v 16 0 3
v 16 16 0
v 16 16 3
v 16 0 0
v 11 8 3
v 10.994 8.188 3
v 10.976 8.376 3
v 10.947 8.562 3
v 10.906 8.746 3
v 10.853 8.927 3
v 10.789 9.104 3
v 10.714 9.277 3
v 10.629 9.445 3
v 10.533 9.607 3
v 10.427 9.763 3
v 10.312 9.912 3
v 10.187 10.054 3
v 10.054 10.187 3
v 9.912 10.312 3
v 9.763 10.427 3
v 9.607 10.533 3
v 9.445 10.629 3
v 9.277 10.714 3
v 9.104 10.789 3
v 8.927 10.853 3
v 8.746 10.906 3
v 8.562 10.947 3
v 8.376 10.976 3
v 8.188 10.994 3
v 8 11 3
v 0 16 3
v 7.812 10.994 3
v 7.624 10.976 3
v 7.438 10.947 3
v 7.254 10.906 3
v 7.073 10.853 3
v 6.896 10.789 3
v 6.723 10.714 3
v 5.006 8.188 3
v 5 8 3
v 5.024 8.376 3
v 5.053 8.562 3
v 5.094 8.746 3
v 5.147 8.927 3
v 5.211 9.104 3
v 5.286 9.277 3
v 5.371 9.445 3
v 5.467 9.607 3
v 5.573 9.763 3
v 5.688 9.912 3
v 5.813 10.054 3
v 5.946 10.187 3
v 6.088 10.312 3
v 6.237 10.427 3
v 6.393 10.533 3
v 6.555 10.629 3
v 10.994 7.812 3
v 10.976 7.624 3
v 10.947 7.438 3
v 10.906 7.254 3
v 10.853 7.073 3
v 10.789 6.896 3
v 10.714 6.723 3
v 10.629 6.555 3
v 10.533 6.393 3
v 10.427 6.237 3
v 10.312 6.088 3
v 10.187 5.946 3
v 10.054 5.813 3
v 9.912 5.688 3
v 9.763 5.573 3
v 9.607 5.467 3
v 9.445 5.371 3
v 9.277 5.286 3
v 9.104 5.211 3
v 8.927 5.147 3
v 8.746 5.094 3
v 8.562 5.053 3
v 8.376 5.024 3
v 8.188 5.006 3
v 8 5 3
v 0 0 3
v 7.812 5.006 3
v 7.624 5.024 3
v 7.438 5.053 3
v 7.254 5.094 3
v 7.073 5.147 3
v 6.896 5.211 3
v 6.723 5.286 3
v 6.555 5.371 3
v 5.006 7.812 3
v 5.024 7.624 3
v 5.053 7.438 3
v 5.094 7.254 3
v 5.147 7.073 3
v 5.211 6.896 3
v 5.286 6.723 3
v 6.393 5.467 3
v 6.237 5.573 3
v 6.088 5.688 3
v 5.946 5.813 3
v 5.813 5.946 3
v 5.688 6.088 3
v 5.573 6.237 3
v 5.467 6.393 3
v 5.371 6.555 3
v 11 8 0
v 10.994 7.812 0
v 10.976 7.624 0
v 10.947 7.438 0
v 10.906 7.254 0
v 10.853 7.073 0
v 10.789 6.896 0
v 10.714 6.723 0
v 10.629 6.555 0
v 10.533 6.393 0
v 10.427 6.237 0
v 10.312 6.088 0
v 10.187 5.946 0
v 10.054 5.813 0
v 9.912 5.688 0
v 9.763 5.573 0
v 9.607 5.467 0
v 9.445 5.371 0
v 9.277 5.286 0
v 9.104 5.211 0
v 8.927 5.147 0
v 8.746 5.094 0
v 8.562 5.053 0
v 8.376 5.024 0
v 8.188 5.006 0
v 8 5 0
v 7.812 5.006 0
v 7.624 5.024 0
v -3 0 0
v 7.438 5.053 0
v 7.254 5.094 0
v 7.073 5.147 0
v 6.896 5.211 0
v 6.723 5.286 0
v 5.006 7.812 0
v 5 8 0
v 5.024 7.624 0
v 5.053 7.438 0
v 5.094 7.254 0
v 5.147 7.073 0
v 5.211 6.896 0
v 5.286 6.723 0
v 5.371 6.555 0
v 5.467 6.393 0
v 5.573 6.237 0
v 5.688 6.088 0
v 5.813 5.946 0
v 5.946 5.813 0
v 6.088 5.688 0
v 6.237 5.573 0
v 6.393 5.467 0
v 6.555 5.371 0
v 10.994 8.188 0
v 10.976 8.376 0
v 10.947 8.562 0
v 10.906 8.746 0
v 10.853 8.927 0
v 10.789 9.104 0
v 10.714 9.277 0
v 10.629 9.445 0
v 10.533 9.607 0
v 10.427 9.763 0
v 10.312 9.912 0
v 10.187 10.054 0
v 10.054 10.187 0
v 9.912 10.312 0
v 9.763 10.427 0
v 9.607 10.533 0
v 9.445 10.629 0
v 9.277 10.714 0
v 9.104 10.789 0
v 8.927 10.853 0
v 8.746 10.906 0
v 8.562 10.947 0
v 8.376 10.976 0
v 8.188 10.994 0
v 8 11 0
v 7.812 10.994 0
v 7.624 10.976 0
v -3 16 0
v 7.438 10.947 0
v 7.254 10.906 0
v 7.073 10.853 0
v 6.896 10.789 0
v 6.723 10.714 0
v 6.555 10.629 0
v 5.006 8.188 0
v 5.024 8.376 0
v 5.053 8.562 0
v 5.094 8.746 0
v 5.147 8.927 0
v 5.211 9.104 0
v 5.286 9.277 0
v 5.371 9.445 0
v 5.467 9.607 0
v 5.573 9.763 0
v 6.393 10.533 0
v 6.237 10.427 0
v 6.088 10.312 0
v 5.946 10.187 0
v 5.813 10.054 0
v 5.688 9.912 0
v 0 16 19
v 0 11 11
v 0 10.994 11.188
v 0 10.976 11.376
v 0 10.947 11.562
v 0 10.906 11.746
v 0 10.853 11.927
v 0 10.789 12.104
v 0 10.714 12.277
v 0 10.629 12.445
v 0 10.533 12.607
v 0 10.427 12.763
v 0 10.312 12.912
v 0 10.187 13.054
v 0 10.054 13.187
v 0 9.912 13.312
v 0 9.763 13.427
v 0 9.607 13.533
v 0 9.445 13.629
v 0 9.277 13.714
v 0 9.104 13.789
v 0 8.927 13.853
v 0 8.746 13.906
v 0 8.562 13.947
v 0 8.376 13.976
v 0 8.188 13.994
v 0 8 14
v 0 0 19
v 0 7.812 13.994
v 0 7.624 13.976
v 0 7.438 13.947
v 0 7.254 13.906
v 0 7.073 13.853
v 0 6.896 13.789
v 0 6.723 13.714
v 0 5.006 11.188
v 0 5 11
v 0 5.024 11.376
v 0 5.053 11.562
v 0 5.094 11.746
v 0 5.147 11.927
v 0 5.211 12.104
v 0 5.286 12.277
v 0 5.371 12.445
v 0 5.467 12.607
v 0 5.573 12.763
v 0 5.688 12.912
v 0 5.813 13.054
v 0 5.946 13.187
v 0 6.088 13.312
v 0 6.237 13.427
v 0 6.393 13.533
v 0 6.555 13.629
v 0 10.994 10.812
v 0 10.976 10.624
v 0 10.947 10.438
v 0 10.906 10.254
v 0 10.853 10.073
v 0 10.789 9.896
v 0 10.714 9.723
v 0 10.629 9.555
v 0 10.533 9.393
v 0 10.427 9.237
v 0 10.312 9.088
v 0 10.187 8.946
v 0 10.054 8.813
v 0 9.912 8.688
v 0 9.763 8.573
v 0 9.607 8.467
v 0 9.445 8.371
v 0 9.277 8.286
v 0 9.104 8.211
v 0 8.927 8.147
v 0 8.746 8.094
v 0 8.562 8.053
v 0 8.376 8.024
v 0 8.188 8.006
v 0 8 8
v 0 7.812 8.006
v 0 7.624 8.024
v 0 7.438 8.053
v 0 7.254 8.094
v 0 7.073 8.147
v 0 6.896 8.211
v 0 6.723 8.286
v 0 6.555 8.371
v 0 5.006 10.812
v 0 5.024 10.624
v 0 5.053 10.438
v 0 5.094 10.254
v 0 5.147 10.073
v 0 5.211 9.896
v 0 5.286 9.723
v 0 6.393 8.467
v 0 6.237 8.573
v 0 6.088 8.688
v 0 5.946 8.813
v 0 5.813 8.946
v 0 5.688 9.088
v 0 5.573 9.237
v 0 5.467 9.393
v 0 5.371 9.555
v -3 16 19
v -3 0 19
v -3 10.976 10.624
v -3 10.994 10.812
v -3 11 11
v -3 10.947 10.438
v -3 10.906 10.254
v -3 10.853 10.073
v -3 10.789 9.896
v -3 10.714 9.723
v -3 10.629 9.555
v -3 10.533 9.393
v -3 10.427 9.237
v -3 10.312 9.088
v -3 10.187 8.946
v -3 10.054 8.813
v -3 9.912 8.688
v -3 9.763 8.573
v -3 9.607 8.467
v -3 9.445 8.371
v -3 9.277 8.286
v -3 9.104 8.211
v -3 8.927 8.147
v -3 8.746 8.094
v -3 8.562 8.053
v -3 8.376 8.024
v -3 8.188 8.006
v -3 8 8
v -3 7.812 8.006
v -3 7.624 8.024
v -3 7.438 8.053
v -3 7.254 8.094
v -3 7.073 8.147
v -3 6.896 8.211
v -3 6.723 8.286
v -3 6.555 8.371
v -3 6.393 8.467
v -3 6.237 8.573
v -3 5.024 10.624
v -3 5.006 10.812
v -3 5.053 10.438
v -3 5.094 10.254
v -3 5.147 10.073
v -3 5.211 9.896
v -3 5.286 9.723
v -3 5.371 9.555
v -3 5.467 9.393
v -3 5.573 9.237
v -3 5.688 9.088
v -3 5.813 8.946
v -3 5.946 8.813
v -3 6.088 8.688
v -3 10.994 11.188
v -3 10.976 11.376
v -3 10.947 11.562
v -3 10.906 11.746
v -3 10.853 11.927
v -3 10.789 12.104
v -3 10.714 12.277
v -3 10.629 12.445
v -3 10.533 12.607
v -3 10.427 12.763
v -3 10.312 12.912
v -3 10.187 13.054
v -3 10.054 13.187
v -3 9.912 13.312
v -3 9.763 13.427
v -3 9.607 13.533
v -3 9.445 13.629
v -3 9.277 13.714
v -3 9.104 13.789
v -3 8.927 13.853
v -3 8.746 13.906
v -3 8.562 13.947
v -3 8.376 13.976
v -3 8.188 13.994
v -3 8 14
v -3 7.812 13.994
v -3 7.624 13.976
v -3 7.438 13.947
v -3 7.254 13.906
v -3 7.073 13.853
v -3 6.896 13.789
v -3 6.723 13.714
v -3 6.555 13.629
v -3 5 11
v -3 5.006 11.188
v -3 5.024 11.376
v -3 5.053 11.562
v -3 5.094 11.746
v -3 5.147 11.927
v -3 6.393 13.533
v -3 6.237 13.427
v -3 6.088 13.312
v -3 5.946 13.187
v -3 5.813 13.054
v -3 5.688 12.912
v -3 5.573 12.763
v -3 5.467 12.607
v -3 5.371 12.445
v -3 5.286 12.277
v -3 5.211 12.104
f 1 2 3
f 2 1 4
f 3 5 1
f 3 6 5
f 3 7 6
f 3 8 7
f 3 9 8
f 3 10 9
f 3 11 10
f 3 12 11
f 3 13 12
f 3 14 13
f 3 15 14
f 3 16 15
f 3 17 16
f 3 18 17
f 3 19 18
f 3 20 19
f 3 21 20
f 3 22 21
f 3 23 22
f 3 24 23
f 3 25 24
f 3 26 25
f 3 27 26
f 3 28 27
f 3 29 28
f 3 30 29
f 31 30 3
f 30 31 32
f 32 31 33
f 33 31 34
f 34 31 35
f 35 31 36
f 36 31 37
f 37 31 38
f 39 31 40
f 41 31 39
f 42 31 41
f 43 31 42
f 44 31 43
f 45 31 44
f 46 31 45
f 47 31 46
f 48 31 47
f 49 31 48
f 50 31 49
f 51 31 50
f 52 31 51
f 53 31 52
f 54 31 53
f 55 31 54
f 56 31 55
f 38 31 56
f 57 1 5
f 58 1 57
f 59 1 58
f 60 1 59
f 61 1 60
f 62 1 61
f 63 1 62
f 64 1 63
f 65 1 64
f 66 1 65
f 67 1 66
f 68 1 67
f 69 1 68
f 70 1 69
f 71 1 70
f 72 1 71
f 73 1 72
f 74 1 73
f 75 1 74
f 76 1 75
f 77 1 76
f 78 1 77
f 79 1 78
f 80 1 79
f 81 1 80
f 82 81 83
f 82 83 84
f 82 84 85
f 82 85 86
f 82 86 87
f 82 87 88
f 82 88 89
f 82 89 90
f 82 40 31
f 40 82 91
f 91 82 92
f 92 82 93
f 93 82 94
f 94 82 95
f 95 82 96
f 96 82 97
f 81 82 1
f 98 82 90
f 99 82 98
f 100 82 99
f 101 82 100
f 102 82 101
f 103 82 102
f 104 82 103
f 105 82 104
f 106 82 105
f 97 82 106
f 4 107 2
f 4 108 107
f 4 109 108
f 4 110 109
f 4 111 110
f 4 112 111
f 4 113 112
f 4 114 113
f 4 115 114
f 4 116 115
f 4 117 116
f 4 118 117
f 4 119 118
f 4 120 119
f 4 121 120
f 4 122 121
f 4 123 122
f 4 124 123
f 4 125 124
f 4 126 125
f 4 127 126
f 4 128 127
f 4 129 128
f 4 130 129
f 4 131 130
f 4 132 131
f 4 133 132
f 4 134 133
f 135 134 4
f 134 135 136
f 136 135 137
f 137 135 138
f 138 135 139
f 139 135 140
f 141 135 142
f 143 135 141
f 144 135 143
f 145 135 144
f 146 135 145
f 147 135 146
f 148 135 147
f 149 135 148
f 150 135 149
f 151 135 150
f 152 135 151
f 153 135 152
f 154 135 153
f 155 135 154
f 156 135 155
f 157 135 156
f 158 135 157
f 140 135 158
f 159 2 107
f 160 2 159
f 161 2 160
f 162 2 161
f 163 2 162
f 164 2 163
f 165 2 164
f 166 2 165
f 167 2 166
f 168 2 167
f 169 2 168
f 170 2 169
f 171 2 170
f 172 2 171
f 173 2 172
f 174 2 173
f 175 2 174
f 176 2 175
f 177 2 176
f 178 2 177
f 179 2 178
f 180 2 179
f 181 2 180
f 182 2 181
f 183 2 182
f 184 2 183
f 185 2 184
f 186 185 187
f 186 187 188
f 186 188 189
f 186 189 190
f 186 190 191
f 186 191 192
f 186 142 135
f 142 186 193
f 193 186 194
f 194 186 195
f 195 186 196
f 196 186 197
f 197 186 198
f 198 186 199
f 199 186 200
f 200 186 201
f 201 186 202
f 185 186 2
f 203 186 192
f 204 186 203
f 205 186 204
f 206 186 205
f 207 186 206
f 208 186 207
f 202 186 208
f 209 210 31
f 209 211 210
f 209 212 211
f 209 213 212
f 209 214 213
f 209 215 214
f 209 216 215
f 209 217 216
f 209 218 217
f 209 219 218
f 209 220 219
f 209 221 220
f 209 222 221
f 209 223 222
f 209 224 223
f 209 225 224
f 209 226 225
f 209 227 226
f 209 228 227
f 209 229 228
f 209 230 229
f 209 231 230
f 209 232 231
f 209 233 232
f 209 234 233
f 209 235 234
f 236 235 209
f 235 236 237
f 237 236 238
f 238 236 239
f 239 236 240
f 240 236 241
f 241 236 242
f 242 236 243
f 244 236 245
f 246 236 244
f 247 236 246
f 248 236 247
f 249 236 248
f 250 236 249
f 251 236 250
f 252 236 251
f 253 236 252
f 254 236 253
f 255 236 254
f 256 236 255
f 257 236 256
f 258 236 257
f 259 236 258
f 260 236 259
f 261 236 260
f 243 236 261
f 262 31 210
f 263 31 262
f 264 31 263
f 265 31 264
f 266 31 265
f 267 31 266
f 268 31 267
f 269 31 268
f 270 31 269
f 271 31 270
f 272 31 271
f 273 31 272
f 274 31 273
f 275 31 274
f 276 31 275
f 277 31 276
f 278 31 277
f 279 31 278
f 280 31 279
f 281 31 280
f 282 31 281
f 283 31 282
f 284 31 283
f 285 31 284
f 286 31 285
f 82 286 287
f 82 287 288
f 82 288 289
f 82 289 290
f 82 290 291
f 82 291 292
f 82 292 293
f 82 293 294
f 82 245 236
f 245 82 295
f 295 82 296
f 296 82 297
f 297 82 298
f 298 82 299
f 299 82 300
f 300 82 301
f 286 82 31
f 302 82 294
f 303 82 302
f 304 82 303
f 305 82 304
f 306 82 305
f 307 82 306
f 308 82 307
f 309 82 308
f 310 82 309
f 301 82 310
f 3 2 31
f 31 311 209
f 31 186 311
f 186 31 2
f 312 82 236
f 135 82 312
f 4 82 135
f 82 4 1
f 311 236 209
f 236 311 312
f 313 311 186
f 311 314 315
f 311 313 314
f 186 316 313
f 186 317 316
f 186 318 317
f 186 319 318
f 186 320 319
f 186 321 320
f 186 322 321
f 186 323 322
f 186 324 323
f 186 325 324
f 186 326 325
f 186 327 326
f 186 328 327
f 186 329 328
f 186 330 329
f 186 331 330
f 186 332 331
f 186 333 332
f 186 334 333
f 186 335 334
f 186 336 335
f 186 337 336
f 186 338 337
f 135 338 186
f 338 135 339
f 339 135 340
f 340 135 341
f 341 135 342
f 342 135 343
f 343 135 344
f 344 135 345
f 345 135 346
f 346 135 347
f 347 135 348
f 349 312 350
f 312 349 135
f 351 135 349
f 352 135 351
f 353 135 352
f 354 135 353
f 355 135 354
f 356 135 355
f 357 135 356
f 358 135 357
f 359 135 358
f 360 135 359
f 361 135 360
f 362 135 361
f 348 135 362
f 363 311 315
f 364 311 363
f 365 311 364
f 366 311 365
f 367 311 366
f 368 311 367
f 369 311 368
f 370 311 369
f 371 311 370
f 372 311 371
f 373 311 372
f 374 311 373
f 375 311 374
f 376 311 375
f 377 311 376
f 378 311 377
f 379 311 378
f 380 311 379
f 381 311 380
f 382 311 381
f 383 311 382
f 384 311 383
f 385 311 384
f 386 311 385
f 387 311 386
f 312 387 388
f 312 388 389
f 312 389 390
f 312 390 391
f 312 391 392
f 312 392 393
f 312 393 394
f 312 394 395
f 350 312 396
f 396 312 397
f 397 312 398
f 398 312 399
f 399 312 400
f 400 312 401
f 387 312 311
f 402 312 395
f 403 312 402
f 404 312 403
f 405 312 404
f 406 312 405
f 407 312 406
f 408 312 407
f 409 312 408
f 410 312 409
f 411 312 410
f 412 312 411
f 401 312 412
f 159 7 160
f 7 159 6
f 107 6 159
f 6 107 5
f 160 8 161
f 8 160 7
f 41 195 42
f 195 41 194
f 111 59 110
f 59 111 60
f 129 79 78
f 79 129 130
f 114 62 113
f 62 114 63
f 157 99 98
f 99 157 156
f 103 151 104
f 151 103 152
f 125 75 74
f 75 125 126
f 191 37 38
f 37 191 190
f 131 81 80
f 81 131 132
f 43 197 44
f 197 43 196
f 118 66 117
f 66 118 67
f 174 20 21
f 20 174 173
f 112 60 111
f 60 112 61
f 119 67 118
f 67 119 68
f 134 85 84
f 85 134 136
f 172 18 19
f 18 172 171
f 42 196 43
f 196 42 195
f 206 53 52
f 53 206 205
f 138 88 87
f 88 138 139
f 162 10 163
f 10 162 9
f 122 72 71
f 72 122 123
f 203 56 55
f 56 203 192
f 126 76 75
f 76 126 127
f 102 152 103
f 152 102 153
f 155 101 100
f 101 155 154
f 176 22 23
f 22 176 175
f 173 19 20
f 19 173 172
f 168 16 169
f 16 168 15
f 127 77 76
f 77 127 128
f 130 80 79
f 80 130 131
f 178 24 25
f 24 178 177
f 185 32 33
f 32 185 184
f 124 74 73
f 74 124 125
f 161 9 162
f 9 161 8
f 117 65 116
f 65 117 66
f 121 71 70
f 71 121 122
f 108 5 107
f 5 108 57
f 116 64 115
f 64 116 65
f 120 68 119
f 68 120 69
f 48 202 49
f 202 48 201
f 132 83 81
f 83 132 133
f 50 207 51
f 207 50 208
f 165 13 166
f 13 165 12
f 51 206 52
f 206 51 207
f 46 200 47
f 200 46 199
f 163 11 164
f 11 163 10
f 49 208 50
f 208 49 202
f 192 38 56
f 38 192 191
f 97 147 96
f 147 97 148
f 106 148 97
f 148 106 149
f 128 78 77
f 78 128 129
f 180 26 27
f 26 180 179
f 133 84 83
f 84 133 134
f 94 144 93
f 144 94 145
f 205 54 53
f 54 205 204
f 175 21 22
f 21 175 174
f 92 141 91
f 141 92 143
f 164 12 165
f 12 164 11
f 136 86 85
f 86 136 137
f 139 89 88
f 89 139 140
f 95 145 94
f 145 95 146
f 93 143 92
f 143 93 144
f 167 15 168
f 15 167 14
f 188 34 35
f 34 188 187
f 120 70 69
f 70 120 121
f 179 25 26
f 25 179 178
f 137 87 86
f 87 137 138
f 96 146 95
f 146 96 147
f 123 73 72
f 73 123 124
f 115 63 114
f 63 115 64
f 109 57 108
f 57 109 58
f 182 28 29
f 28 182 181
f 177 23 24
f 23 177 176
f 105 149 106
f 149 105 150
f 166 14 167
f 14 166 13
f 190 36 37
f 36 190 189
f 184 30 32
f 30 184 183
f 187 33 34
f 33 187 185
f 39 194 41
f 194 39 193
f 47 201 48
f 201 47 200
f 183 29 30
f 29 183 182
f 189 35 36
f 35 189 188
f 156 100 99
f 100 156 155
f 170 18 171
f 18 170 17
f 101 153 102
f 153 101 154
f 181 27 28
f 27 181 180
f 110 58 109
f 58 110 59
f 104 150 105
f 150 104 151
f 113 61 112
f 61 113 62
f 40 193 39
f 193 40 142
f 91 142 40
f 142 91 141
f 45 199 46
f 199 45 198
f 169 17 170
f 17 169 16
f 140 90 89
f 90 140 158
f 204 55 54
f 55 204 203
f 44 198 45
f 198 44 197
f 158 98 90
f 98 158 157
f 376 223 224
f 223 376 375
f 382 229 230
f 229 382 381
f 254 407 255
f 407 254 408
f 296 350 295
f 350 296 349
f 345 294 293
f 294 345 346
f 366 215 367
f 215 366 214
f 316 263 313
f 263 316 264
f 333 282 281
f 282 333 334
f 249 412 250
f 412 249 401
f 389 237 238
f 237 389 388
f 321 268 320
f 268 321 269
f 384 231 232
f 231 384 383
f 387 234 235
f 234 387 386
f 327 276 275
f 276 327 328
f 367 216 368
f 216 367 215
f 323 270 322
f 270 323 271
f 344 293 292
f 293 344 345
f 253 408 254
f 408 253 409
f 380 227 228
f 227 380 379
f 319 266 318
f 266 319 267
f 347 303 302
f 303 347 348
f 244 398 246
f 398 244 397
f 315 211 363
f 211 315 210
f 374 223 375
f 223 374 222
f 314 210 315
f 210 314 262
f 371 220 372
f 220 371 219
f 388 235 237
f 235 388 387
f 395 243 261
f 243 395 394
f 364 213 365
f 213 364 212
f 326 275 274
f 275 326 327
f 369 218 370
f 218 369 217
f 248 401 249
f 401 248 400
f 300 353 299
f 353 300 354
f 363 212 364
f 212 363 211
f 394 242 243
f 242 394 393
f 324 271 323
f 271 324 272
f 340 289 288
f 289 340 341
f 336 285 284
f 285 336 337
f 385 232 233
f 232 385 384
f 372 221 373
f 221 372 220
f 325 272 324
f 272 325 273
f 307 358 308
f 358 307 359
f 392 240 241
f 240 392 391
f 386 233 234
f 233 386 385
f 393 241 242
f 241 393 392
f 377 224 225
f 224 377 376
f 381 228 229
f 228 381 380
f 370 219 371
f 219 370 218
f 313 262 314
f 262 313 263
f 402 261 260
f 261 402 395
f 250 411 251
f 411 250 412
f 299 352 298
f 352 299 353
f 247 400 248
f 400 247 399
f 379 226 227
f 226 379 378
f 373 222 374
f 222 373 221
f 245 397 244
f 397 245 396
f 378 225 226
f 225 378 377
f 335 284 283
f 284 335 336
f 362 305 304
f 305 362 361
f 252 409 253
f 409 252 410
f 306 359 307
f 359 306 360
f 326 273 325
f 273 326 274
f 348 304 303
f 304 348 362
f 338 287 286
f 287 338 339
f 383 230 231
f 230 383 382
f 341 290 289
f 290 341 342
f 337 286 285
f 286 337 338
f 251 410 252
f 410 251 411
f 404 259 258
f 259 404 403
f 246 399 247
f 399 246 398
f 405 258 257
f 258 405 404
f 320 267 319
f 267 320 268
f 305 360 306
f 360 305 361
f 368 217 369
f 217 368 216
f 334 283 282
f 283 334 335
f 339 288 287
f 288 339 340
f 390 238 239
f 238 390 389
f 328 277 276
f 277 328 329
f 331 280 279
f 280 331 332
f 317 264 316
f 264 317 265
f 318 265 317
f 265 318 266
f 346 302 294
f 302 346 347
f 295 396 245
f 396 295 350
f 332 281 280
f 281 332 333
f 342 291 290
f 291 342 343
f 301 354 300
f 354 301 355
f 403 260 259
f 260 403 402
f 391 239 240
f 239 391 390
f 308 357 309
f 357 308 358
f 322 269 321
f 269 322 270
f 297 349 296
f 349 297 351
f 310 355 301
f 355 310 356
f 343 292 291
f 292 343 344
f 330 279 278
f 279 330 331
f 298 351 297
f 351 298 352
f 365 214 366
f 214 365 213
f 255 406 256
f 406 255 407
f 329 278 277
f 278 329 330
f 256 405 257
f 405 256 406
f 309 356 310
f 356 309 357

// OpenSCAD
$fn = 100;

module bracket(r = 2, thickness = 3, padding = 5, countersink = true) {
    difference() {
        union() {
            cube([r * 2 + padding * 2, r * 2 + padding * 2, thickness]);
            translate([-thickness, 0, 0]) {
                cube([thickness, r * 2 + padding * 2, thickness + r * 2 + padding * 2]);
            }
        }
        union() {
            upper_radius = countersink ? r + thickness : r;
            translate([padding + r, padding + r, 0]) {
                cylinder(r1 = r, r2 = upper_radius, h = thickness, $fn = $fn);
            }
            rotate([0, 270, 0]) 
            translate([thickness + padding + r, padding + r, 0]) {
                cylinder(r2 = r, r1 = upper_radius, h = thickness, $fn = $fn);
            }
        }
    }
}

bracket(r = 3, padding = 5, countersink = false);
